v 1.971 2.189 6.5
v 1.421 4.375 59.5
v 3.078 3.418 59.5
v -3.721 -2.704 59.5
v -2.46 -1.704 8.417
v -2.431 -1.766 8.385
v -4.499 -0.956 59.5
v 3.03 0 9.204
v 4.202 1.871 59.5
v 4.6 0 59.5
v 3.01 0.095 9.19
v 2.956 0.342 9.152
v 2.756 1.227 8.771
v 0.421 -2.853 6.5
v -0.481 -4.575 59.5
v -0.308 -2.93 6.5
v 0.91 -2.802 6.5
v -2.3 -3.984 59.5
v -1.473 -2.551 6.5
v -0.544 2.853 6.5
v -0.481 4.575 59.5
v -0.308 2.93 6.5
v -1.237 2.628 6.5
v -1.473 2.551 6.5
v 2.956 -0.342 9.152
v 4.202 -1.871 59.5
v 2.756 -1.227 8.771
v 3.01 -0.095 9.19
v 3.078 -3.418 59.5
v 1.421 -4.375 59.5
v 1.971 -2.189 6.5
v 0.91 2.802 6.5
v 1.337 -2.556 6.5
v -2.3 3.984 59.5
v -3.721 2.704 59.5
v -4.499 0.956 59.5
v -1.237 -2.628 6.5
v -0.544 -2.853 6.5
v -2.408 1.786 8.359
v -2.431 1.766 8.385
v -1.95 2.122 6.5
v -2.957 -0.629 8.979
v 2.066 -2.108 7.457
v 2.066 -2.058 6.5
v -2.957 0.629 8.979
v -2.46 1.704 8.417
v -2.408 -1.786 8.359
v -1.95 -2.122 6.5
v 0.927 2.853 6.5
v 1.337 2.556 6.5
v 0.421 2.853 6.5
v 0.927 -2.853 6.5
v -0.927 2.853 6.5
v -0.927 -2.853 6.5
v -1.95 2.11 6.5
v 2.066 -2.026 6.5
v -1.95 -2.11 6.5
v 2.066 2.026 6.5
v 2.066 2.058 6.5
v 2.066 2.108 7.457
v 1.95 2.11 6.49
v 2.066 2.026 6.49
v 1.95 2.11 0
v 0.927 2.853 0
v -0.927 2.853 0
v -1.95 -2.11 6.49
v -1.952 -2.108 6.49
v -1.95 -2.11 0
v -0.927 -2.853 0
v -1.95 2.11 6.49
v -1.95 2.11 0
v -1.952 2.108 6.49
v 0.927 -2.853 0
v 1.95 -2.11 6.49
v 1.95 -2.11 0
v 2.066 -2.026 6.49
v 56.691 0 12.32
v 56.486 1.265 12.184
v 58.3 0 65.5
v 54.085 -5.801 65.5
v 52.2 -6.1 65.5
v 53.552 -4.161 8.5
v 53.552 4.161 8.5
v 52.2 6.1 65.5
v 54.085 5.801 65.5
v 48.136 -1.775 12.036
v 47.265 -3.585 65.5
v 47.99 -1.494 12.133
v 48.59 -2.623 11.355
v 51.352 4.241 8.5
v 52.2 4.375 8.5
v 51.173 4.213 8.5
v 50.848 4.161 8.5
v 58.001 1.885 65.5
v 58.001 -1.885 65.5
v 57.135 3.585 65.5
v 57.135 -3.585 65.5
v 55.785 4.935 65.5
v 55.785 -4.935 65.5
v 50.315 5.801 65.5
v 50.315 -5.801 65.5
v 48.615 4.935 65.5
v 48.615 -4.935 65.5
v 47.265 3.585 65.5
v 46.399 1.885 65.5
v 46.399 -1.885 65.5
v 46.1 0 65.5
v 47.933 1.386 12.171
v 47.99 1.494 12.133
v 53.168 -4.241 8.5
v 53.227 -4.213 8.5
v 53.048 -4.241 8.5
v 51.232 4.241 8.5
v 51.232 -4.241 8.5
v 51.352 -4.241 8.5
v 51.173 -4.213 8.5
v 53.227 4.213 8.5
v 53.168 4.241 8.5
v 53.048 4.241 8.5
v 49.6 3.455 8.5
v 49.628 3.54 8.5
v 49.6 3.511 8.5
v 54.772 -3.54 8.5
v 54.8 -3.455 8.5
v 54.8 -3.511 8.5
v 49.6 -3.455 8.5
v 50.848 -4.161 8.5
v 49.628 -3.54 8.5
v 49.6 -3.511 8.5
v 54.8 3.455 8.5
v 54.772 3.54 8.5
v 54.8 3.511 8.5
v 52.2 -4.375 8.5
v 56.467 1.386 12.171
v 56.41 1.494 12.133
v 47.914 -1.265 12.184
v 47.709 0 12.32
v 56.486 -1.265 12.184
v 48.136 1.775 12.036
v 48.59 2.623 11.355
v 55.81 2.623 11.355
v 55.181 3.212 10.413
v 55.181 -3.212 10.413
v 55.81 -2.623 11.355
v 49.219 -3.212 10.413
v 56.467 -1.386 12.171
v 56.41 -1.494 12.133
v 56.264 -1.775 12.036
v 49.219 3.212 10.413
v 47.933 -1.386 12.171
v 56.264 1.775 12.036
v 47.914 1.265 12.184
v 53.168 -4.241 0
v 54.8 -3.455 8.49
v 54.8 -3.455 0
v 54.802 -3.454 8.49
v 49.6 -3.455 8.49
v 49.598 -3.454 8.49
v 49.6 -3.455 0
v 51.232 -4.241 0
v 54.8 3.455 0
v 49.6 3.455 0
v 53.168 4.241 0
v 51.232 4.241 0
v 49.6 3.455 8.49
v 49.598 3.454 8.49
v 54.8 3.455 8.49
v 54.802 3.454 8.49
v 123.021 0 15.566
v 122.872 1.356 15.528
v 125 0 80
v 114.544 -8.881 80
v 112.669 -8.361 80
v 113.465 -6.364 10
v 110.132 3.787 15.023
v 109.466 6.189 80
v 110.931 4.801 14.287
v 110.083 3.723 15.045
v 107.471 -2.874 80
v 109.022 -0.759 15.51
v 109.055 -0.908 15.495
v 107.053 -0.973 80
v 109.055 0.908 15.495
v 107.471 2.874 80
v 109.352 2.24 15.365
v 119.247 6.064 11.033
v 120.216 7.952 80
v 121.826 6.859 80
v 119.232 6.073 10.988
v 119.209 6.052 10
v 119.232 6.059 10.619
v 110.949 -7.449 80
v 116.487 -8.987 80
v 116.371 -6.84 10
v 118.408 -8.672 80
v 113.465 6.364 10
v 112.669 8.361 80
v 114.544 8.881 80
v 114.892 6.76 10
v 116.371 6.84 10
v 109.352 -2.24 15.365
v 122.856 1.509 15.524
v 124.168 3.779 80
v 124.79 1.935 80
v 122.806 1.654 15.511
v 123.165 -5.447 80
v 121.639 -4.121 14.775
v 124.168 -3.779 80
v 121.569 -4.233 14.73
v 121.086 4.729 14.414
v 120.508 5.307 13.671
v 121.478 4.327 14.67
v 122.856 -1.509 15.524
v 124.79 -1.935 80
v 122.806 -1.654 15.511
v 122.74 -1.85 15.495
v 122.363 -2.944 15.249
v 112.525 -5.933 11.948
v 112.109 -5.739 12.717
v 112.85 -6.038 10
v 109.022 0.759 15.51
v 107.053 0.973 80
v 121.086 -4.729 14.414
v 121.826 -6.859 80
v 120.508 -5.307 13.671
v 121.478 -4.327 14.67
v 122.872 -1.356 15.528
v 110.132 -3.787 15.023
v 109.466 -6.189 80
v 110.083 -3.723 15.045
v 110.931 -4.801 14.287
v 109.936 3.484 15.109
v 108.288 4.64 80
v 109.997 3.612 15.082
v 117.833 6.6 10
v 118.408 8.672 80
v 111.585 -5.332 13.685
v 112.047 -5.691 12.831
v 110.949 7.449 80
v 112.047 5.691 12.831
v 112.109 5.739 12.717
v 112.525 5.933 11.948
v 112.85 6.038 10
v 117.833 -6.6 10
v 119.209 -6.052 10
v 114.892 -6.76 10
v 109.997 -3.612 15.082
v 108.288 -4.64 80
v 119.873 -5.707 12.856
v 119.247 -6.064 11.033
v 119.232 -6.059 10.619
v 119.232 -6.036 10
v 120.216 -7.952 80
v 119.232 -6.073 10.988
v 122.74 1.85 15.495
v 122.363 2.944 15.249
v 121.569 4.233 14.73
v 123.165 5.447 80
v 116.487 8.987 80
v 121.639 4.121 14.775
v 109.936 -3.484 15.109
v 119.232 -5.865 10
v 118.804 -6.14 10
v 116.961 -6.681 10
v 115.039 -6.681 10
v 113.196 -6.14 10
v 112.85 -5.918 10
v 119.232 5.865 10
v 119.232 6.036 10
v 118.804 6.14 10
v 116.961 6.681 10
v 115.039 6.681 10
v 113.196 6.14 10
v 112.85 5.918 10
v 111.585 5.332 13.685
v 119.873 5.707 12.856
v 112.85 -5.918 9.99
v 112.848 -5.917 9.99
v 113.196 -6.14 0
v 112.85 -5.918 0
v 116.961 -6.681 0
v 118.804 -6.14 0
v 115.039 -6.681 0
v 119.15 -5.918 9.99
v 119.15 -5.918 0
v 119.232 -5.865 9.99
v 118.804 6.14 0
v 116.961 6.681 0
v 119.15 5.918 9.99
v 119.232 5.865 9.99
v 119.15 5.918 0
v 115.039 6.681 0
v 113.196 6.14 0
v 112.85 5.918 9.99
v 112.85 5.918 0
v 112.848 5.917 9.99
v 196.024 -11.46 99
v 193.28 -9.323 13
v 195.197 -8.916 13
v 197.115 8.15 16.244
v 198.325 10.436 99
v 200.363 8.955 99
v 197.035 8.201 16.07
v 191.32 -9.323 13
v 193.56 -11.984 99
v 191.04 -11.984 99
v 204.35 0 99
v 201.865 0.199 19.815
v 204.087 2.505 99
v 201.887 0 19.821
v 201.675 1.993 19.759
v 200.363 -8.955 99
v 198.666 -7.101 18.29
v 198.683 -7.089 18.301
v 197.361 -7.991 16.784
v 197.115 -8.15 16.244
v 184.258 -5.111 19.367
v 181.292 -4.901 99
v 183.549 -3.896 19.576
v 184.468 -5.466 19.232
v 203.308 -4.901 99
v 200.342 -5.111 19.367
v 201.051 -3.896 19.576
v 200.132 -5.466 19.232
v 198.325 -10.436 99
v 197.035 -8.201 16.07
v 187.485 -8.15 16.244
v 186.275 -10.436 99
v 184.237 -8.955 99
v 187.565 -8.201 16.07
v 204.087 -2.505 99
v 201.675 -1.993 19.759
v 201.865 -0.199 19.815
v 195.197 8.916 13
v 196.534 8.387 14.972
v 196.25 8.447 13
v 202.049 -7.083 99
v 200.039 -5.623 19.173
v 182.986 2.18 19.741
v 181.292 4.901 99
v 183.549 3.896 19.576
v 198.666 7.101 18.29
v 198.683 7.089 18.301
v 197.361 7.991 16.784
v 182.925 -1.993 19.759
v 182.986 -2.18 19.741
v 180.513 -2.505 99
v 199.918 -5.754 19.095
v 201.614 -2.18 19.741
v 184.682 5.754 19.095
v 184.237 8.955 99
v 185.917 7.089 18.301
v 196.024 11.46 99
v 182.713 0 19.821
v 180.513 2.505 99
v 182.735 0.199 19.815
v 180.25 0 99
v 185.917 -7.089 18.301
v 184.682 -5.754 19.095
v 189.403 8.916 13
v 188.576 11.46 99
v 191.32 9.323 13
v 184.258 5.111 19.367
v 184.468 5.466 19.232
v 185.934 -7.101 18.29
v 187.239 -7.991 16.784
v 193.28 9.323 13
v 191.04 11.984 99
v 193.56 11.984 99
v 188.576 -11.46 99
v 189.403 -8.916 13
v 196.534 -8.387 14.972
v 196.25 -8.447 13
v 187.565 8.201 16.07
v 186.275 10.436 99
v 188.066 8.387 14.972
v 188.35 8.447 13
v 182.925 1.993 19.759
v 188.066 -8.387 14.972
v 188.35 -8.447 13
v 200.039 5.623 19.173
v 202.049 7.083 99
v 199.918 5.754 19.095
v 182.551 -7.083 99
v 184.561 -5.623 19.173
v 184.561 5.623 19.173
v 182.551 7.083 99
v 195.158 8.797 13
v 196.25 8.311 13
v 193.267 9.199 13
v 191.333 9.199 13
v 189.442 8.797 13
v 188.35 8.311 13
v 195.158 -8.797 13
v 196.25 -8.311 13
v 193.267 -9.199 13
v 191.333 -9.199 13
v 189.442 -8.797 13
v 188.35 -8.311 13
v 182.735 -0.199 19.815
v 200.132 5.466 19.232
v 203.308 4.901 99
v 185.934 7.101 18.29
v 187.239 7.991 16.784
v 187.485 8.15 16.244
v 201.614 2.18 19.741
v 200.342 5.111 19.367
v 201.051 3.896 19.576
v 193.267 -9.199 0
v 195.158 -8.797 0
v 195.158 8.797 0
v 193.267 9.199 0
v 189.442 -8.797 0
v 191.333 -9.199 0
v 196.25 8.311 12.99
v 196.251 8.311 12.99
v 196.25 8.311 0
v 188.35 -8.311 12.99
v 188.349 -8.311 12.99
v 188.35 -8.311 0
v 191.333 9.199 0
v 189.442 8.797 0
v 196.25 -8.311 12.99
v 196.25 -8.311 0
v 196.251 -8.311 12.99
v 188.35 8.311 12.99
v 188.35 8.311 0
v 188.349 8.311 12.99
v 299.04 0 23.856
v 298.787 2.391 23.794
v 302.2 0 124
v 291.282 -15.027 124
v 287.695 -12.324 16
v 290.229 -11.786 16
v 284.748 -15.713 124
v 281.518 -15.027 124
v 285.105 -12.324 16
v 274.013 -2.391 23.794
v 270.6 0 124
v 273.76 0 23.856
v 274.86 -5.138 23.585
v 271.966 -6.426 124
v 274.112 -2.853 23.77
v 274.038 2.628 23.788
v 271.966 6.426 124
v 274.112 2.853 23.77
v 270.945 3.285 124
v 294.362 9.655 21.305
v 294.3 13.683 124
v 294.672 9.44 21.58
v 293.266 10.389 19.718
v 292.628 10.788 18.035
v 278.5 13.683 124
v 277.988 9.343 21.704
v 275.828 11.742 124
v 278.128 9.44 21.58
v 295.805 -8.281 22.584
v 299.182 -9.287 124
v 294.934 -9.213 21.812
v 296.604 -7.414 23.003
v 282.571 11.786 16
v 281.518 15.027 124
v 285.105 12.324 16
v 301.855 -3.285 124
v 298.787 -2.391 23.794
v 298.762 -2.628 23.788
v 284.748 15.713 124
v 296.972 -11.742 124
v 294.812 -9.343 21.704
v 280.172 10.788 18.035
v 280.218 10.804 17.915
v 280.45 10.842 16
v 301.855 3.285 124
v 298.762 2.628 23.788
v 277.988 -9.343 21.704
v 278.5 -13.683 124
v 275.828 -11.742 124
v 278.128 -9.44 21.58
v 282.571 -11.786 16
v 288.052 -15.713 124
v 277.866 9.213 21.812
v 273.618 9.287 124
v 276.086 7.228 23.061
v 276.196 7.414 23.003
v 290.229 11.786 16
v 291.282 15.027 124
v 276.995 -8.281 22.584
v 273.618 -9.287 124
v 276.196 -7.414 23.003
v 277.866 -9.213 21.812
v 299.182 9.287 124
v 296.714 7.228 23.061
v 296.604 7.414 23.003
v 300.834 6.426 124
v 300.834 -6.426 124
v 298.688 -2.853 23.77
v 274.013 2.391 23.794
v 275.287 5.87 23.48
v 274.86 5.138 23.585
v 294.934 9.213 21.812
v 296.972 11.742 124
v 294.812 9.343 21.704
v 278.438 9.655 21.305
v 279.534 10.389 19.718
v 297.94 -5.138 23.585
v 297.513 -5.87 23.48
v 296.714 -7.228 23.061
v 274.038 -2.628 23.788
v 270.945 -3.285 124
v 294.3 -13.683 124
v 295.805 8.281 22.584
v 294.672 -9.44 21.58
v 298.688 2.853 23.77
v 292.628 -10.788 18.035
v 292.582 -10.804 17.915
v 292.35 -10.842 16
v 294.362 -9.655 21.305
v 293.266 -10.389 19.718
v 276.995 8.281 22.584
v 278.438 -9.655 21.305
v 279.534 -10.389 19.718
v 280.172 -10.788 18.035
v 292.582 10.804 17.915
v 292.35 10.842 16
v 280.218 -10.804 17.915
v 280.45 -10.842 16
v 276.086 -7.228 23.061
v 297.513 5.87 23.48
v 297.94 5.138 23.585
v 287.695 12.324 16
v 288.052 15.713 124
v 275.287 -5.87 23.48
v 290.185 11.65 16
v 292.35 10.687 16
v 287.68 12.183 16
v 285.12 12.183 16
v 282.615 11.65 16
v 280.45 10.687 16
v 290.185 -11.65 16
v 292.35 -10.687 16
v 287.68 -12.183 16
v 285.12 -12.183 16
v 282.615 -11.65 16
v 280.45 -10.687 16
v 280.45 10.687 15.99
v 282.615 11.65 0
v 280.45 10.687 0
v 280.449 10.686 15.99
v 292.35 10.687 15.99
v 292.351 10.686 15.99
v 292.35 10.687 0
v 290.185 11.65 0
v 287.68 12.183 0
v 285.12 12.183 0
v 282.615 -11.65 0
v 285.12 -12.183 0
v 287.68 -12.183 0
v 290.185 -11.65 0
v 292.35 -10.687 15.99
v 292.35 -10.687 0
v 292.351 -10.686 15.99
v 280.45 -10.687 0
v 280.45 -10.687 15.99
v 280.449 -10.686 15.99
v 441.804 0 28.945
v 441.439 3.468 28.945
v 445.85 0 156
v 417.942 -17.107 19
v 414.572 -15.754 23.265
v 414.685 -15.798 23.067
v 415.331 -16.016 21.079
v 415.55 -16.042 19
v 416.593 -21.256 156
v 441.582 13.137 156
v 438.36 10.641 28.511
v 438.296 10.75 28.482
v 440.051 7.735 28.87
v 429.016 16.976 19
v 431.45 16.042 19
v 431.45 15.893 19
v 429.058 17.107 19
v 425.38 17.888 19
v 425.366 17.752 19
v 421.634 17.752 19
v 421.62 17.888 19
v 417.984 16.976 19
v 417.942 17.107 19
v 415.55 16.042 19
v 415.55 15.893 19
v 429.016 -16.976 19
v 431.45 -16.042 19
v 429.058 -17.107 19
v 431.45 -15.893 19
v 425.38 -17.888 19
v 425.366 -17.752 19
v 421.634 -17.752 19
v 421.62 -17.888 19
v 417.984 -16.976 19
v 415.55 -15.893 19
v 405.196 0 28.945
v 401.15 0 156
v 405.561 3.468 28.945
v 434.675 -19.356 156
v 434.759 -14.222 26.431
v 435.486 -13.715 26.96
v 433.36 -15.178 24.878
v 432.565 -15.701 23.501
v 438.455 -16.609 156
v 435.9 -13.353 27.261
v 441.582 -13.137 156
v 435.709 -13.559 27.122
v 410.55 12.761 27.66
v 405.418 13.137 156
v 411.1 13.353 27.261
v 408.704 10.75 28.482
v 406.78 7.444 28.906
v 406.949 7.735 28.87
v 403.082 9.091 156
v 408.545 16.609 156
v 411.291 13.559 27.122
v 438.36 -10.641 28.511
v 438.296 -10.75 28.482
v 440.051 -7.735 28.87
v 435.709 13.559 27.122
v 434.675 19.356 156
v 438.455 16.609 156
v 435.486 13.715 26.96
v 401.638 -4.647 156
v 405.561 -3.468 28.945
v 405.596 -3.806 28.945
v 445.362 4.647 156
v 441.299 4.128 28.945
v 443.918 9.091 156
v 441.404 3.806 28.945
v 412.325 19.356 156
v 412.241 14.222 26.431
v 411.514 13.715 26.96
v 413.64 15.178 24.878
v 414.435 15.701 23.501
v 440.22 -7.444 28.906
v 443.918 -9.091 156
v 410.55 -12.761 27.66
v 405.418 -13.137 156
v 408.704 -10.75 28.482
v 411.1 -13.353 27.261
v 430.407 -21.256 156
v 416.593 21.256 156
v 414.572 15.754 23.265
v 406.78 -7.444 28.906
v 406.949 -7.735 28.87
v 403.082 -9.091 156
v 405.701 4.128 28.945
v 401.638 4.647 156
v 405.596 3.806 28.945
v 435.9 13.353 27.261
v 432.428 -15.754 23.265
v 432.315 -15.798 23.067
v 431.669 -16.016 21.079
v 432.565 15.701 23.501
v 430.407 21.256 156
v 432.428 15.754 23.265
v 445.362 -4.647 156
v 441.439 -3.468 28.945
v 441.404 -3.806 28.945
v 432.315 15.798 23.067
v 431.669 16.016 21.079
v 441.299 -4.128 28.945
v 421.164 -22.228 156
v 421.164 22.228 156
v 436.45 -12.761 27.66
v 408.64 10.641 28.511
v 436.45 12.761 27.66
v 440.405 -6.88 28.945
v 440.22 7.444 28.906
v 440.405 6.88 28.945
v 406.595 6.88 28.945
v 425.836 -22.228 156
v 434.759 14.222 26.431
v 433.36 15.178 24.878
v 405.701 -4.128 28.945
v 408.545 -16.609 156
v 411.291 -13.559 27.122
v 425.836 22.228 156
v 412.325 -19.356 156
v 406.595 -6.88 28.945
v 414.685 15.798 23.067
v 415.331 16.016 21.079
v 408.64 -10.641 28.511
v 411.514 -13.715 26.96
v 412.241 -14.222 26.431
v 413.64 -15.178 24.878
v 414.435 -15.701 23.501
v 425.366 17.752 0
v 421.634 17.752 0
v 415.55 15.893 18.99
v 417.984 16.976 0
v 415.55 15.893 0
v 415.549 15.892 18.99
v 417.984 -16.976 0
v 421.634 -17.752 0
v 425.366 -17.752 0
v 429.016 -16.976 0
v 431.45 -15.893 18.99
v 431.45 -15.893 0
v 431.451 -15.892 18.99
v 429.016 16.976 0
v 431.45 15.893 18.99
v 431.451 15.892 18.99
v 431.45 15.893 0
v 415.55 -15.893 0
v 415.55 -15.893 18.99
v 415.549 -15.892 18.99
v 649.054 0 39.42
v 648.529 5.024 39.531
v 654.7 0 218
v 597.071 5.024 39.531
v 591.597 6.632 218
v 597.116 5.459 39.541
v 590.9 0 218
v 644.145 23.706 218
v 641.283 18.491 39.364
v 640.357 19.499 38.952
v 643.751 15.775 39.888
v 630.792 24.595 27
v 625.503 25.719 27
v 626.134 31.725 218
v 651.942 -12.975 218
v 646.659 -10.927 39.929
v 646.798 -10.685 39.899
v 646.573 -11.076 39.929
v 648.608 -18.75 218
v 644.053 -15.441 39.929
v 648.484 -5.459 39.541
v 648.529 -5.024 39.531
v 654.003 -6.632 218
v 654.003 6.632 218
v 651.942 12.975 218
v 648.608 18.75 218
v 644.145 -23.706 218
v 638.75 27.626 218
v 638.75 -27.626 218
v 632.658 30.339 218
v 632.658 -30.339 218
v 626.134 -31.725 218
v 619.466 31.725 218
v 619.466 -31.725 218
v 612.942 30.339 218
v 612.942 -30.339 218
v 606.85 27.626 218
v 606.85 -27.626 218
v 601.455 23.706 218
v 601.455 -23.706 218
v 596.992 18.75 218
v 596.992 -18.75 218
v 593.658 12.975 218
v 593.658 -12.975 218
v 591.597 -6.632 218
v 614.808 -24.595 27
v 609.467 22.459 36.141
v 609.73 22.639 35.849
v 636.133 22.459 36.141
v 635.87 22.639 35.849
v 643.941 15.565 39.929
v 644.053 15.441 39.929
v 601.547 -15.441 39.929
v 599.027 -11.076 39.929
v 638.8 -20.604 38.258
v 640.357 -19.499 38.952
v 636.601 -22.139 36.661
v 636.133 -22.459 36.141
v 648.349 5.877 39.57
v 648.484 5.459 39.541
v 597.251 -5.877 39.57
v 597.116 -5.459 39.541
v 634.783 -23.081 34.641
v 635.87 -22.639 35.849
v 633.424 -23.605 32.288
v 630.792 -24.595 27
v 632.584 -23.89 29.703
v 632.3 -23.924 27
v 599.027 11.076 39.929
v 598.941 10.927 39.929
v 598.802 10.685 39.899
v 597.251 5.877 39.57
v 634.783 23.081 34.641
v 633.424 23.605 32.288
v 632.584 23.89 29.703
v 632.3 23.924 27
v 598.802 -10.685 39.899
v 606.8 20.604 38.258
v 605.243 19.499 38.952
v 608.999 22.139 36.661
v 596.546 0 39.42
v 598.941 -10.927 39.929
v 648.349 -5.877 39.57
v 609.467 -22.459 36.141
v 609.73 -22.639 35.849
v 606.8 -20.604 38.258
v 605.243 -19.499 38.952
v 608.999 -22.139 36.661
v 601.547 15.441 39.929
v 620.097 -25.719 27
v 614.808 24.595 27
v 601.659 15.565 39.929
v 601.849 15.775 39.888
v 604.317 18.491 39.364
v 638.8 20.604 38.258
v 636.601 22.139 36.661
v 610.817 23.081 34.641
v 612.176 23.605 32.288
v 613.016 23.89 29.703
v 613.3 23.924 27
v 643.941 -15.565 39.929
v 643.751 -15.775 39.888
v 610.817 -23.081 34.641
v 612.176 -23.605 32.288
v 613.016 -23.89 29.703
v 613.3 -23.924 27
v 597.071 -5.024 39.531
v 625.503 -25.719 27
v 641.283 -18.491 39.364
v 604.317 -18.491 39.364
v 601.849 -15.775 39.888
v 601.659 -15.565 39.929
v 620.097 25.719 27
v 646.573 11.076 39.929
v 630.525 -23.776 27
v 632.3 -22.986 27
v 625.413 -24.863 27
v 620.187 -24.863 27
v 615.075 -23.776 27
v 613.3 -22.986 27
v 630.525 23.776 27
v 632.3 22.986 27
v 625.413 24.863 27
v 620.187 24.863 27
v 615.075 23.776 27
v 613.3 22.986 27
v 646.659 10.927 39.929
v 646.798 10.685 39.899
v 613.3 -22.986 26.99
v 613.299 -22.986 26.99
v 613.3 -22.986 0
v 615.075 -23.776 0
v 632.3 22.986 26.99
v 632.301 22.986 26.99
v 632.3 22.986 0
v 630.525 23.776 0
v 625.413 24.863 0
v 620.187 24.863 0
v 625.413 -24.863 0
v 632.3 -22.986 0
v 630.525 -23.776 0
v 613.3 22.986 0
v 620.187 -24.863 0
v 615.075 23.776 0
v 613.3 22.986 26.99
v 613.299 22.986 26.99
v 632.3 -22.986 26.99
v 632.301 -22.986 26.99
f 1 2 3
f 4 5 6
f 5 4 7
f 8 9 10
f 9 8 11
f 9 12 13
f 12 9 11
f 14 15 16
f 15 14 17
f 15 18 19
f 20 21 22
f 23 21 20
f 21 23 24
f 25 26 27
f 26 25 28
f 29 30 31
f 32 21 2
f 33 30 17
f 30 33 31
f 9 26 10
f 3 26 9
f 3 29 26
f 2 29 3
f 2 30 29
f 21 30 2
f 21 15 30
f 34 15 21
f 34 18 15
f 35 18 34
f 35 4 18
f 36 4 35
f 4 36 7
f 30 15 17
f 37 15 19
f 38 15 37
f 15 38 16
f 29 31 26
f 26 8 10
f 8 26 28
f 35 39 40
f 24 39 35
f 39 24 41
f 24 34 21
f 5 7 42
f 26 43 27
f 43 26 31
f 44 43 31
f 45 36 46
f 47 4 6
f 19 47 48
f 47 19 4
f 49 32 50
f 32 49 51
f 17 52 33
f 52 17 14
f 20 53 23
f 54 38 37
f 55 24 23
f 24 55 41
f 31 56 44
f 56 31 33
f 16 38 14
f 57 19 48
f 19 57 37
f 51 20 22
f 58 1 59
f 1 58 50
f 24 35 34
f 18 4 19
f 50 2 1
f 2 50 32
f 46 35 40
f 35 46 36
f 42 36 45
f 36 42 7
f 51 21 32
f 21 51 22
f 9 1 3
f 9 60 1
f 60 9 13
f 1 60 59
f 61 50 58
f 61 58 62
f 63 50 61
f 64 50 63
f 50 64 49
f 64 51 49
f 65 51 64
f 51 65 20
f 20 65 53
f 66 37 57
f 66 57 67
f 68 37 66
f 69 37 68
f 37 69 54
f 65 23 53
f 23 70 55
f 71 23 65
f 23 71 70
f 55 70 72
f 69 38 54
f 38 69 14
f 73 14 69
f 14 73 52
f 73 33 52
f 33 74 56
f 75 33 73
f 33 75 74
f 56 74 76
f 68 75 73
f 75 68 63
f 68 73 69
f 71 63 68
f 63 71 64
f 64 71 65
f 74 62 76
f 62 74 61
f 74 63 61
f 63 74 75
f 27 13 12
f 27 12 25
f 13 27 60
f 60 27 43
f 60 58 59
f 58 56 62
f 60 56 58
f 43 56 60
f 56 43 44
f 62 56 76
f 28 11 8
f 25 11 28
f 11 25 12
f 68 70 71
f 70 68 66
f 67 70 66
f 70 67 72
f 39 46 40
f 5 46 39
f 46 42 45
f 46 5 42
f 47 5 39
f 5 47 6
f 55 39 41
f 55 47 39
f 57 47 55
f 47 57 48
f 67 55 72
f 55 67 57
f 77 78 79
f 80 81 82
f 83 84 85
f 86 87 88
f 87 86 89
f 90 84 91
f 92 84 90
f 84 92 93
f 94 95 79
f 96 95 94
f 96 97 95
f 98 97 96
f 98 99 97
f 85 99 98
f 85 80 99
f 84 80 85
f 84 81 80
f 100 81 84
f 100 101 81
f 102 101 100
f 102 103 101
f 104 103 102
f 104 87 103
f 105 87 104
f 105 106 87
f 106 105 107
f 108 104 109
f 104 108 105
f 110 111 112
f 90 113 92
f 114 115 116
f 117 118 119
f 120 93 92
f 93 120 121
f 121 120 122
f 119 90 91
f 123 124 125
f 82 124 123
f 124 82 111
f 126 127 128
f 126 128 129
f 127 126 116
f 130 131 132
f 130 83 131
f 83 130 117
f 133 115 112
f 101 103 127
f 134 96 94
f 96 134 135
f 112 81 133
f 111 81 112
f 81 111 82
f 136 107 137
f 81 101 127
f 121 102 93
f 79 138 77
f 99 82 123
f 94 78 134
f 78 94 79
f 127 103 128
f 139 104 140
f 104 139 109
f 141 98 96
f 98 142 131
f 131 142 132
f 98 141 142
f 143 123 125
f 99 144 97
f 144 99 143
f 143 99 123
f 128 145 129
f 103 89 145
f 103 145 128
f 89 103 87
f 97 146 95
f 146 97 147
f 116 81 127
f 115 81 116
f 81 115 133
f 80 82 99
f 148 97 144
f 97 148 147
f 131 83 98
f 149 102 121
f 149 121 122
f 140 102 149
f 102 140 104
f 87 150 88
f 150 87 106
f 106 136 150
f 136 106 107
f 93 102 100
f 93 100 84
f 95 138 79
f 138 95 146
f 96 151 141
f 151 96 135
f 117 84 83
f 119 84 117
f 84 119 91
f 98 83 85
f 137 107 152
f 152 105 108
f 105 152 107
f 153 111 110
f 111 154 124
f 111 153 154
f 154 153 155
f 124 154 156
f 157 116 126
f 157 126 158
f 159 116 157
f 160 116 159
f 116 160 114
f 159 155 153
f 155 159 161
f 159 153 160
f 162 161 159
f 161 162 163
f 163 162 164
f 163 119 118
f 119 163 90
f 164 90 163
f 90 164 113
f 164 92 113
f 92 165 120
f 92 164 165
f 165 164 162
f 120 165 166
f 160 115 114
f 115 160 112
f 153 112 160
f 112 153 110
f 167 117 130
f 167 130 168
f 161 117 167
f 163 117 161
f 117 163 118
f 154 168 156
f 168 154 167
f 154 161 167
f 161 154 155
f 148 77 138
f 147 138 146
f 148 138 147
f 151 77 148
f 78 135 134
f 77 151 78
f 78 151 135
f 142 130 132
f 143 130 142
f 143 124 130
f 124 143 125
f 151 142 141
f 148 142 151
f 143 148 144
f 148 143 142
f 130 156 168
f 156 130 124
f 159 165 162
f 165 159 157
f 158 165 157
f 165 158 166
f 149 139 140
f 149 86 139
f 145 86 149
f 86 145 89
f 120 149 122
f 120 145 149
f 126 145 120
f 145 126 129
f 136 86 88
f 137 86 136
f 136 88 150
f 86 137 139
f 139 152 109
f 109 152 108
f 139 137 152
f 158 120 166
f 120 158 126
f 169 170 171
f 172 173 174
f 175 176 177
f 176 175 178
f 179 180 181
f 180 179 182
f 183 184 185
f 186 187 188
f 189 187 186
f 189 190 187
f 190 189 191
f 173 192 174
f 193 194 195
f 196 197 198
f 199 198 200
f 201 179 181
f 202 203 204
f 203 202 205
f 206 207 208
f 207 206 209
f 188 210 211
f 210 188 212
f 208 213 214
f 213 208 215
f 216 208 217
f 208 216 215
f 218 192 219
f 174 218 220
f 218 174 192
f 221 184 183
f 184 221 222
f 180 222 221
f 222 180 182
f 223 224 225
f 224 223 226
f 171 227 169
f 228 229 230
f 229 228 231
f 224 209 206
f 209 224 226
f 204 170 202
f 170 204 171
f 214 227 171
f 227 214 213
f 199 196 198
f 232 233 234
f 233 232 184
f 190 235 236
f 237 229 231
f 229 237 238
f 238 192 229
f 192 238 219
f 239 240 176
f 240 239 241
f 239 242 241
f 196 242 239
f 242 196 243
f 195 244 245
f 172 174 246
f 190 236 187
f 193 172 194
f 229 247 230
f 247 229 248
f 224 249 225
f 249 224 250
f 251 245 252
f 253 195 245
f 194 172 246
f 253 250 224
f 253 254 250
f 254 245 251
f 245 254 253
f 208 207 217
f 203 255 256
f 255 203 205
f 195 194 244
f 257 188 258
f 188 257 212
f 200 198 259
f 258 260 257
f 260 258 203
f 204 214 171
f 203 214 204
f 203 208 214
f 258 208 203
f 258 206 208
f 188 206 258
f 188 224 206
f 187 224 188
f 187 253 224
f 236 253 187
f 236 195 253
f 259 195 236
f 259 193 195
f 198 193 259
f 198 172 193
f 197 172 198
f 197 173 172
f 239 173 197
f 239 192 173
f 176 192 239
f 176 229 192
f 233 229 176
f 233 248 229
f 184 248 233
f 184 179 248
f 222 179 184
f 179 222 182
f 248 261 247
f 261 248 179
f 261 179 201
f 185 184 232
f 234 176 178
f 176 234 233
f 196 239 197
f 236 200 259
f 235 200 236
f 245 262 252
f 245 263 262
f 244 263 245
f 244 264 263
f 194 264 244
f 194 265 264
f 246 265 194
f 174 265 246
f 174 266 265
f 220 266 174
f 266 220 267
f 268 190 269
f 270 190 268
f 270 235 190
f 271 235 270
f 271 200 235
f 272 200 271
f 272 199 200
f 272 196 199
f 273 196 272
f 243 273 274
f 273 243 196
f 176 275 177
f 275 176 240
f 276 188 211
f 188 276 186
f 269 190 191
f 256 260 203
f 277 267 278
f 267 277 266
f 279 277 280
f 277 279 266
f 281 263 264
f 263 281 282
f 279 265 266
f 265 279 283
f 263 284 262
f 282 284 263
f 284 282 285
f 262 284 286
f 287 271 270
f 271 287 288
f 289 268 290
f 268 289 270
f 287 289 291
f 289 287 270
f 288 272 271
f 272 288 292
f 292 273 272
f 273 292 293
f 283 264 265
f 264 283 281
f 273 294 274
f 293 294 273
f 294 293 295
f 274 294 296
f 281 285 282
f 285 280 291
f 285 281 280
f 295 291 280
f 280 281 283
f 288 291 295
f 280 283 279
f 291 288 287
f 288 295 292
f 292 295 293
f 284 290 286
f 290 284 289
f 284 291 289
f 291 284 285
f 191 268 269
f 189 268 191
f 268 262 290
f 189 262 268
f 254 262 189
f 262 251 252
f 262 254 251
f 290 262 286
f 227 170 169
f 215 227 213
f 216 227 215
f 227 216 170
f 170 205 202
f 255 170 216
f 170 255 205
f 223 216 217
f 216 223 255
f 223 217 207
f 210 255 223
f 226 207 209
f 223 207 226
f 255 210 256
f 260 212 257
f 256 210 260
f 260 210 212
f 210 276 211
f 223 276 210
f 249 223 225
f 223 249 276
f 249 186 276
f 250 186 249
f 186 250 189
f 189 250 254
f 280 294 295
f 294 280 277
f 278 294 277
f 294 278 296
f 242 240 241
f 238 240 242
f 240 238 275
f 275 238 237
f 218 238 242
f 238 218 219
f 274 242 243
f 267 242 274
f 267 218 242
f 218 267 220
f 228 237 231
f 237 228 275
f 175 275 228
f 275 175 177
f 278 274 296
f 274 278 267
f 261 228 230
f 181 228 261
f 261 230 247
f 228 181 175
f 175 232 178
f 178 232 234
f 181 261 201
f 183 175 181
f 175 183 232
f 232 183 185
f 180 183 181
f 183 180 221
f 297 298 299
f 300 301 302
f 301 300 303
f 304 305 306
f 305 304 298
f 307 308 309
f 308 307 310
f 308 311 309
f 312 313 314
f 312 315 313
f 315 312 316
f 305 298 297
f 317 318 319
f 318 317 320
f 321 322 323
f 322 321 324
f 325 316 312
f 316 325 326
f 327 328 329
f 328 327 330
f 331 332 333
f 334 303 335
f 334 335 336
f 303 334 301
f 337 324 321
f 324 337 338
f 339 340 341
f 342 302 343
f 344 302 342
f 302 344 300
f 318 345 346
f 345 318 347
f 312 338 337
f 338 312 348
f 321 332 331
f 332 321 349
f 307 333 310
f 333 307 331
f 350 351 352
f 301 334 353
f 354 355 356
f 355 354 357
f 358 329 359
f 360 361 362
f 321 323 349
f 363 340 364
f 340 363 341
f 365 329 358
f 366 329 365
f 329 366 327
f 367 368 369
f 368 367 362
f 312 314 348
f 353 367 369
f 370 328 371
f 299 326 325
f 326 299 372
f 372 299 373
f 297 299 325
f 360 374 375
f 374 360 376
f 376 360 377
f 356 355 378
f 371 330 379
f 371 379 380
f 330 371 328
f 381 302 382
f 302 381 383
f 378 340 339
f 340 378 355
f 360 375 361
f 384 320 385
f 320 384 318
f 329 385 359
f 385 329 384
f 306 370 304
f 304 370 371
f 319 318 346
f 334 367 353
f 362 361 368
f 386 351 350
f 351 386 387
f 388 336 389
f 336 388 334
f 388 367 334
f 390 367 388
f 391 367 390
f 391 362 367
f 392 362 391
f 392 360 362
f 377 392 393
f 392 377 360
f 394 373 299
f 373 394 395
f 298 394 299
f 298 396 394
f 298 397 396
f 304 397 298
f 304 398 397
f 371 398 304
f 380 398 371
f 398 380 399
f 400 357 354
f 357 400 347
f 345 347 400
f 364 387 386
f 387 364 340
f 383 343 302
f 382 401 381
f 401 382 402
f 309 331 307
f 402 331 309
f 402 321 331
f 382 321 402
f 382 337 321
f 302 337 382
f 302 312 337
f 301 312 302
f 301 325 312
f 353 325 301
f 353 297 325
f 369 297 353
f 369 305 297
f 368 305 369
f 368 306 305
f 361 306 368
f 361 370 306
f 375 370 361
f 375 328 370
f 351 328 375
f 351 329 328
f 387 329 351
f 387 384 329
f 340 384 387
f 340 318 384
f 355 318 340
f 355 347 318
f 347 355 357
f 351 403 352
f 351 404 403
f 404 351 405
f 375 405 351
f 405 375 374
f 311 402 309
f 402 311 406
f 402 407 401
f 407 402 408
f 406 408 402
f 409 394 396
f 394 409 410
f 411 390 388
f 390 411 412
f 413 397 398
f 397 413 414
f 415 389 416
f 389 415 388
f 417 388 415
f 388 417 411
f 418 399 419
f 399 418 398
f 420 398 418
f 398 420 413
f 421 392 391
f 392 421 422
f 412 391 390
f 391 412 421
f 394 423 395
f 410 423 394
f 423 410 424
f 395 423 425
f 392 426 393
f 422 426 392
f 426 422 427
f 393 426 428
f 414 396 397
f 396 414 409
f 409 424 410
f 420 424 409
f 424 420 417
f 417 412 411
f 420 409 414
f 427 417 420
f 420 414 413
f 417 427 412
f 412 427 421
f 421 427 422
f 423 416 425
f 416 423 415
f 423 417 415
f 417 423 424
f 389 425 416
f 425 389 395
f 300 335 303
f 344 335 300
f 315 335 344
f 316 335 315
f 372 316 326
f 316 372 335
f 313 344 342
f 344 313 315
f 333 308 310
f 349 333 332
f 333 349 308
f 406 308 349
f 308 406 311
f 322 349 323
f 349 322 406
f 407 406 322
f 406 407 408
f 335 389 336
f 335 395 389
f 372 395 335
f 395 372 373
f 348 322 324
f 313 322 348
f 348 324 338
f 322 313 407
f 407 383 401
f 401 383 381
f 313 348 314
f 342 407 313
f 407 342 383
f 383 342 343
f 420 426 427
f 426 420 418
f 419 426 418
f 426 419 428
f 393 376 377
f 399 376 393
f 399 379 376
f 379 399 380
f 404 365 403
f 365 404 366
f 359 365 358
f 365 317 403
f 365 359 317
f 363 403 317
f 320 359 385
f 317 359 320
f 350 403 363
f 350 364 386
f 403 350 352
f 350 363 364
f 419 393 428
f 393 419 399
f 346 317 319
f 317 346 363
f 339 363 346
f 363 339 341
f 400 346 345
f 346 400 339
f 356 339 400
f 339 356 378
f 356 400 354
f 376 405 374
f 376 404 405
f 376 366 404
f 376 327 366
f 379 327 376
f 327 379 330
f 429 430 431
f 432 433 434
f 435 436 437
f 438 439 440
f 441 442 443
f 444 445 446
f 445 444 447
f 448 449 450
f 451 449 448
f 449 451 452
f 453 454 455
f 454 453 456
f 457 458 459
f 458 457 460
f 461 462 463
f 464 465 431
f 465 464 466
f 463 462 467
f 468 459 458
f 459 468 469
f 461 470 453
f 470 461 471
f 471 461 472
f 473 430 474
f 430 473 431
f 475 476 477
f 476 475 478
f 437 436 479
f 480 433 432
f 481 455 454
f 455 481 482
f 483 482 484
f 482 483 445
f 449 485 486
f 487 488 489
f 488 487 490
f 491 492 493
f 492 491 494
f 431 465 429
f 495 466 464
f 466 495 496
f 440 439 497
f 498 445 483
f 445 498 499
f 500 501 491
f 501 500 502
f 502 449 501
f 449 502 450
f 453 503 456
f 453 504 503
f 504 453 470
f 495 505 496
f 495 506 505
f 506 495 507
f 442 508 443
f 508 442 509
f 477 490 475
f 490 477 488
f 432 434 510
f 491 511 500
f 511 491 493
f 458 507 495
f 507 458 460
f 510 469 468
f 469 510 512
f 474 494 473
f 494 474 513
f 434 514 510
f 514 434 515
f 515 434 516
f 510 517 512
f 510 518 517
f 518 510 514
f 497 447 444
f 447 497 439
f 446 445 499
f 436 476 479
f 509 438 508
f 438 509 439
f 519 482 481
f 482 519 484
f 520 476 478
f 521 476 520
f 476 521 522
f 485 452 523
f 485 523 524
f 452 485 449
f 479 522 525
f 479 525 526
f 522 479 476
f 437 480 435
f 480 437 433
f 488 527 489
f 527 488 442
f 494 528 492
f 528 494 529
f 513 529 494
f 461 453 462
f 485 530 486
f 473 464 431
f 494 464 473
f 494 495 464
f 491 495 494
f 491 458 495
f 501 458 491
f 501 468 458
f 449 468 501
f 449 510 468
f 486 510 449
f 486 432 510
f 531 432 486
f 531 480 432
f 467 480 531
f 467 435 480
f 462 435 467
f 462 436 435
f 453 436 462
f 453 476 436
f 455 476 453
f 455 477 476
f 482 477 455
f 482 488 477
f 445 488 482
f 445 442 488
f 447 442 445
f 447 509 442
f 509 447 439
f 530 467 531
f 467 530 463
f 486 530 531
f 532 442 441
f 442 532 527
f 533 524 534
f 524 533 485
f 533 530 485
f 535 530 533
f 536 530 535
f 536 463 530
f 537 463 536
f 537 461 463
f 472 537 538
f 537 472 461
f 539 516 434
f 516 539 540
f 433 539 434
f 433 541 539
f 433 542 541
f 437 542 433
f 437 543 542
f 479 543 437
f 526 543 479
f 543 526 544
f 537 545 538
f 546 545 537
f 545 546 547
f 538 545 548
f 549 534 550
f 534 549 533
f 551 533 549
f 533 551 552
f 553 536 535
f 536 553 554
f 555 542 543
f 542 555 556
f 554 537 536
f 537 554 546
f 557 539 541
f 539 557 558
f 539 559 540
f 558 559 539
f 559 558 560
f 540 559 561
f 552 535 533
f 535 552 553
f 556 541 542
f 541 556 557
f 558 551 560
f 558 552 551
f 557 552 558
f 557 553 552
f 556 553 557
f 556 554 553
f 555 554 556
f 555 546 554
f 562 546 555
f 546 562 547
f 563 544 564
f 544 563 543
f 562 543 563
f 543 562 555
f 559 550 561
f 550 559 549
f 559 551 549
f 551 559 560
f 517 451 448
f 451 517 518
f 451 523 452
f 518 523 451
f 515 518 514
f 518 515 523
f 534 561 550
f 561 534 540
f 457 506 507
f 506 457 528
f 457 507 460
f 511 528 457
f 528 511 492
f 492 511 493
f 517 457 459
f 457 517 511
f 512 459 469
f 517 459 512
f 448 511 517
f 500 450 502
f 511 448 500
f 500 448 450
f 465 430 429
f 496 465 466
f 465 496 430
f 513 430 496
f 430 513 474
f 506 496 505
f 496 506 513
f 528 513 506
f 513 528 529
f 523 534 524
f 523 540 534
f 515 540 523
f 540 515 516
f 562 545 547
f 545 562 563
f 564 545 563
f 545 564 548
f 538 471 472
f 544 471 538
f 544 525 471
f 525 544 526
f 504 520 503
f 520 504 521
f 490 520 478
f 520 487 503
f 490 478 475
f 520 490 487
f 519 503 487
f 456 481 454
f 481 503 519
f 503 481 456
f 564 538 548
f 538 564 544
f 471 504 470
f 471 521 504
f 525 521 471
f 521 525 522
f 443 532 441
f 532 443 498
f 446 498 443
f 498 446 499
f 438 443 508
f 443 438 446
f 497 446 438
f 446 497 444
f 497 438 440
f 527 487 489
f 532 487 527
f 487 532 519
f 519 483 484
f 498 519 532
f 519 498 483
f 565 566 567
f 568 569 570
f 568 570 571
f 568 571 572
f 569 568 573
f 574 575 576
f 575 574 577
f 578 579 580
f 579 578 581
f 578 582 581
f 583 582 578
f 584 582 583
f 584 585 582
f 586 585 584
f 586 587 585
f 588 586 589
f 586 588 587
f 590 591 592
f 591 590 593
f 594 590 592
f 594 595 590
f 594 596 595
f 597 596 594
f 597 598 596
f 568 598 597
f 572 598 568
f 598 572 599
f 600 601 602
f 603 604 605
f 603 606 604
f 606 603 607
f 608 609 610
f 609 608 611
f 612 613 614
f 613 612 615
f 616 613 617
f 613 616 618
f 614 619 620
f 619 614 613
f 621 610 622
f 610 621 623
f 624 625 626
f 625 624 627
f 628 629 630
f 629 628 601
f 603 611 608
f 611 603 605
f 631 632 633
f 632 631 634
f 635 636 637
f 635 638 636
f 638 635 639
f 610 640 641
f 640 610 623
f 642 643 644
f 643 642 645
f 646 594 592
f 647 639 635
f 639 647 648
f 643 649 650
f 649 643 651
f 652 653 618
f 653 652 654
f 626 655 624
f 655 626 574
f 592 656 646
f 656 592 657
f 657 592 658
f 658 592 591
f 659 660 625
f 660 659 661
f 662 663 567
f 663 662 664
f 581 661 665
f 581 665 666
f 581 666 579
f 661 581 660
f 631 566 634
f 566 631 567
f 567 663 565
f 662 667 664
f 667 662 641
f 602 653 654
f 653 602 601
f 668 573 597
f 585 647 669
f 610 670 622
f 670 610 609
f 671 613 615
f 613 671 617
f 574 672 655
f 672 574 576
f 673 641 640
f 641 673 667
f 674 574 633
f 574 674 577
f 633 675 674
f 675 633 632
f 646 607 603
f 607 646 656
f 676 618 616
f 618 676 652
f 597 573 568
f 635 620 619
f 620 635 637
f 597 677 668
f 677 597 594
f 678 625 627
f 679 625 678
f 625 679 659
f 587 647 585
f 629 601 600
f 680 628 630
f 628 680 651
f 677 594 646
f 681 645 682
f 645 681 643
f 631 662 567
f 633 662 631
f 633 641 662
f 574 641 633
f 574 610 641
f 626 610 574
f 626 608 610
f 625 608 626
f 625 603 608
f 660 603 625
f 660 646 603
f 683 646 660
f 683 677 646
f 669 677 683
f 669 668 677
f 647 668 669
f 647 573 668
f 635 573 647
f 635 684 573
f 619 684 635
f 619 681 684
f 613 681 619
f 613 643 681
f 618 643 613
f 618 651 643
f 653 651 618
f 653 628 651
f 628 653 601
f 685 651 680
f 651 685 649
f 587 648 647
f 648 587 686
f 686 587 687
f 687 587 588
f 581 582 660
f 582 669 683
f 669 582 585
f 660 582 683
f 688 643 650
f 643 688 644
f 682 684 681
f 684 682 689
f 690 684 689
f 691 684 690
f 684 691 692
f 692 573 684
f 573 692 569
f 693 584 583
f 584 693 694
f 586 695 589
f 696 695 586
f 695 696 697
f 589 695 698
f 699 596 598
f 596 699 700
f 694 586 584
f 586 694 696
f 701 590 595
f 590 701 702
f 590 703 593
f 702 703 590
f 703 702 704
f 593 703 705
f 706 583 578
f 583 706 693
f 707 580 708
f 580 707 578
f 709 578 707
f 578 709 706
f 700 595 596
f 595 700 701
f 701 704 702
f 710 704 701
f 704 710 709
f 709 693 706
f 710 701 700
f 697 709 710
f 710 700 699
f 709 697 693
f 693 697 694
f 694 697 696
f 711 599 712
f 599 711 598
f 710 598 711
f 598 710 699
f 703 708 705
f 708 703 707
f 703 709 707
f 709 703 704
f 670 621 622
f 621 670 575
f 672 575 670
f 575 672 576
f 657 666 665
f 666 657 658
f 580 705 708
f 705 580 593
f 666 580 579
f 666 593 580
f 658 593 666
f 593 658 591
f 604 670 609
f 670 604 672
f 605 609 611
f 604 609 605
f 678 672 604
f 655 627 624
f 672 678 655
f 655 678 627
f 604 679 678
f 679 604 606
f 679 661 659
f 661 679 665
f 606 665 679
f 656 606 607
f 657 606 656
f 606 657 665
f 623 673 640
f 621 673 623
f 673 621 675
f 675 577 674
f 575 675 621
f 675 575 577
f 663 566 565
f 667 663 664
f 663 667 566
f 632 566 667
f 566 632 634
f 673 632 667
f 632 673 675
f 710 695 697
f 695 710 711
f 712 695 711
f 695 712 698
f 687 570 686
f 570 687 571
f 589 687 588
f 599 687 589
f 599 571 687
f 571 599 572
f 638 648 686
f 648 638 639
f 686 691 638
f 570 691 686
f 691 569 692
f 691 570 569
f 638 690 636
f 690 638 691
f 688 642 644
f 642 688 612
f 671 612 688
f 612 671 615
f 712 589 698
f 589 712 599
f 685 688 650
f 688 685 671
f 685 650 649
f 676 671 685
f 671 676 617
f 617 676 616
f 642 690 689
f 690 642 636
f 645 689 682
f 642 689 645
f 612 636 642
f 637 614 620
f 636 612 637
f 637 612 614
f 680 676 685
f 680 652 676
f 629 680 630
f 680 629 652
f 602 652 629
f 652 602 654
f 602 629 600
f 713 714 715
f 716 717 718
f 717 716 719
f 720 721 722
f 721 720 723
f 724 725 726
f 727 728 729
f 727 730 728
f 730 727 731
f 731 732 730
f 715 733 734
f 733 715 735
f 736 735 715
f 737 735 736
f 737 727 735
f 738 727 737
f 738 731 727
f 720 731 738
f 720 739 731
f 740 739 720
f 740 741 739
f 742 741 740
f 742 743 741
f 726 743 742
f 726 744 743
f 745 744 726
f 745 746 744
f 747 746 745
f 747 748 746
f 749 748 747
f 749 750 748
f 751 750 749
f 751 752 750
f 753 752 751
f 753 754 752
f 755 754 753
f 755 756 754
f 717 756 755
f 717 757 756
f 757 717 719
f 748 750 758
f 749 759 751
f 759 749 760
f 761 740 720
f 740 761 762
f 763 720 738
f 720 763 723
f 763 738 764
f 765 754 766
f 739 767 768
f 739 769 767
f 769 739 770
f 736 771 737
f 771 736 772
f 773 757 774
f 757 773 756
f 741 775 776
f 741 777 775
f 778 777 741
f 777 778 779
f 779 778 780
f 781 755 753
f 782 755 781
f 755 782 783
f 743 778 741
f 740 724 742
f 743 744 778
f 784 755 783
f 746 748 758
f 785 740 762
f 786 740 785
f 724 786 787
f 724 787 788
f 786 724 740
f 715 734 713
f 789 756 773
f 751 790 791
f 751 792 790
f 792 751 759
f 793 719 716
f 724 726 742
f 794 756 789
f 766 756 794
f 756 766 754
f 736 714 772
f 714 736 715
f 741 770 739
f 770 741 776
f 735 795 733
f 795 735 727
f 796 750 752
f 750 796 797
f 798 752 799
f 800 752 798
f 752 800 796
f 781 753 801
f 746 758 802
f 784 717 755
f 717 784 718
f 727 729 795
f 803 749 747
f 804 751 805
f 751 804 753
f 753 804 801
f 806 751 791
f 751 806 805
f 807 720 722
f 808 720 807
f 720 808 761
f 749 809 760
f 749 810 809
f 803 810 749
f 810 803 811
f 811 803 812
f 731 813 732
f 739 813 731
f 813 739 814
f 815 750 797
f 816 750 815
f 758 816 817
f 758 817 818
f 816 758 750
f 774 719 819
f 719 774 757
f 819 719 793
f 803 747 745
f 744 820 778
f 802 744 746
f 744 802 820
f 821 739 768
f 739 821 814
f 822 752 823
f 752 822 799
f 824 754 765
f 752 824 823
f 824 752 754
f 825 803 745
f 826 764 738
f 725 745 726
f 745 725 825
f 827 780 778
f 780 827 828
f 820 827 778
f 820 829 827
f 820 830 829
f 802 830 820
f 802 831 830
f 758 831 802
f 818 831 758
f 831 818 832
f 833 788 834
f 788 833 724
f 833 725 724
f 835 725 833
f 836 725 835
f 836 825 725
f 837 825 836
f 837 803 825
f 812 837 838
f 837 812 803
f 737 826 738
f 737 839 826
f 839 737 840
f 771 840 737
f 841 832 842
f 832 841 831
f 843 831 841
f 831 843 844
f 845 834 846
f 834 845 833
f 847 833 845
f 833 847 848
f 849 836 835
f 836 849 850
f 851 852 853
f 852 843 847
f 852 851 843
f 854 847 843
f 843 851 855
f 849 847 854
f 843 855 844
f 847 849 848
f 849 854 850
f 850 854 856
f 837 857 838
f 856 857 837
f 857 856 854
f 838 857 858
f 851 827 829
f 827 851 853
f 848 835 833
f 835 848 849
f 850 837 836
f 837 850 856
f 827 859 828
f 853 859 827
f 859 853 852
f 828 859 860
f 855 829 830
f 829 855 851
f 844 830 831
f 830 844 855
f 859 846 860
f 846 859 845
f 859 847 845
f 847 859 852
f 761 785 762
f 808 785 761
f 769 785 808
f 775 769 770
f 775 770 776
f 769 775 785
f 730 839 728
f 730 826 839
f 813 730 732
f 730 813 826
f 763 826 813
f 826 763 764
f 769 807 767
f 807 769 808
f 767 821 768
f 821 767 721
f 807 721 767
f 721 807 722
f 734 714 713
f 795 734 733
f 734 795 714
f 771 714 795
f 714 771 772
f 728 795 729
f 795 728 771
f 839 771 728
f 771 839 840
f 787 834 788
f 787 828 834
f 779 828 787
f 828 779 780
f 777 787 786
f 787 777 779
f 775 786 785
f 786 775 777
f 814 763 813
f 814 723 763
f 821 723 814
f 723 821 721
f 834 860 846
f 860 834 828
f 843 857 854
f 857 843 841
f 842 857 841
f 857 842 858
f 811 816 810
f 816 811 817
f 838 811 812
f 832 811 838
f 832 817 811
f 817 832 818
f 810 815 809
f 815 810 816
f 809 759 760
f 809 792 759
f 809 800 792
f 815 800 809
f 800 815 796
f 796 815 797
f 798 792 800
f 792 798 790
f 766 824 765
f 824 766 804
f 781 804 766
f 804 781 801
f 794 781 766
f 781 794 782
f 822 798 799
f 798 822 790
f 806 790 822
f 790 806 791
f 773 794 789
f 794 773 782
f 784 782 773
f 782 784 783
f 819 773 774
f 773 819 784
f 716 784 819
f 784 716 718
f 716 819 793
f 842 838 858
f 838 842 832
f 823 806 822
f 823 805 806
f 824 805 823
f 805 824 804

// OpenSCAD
// Morse tape

tolerance=0.01;
//Morse Tape Params (plan: https://upload.wikimedia.org/wikipedia/commons/9/99/Morse_Taper.png) 
MT_Params=[
//0 MT№,   1 ctg(a),    2 D,       	3 D1, 	4 d, 	5 d1, 	6 d2, 	7 d3max,8 d4max,9 d5,   10 l1max,   11 l2 max,  12 l3 max, 	13 l4 max, 	14 l5 min, 	15 l6,  16 e max,   17 R,   18 b,          
[0,        19.212, 	    9.045, 	    9.2, 	6.4, 	0,  	6.1, 	6,   	6,  	6.7, 	50, 	    53, 	    56.3,   	59.5,   	52,     	49,     10.5,       4,      3.9,],
[1,        20.047, 	    12.065, 	12.2, 	9.4,	6, 	    9, 	    8.7, 	9, 	    9.7, 	53.5, 	    57, 	    62, 	    65.5, 	    56,     	52,     13.5,       5,      5.2,],
[2,        20.020, 	    17.780, 	18,	    14.6, 	10, 	14,	    13.5, 	14, 	14.9, 	64, 	    69, 	    75, 	    80,     	67,     	62,     16,         6,      6.3,],
[3,        19.922, 	    23.825, 	24.1, 	19.8, 	12, 	19.1, 	18.5, 	19, 	20.2, 	80.1, 	    86, 	    94, 	    99,     	84,     	78,     20,         7,      7.9,],
[4,        19.254, 	    31.267, 	31.6, 	25.9, 	16, 	25.2, 	24.5, 	24, 	26.5, 	102.5, 	    109, 	    117.5,   	124,    	107,    	98,     24,         8,      11.9,],
[5,        19.002, 	    44.399, 	44.7, 	37.6, 	20, 	36.5, 	35.7, 	35.7, 	38.2, 	129.5, 	    136, 	    149.5,   	156,    	135,    	125,    29,         10,     15.9,],
[6,        19.180, 	    63.348, 	63.8, 	53.9, 	24, 	52.4, 	50, 	51, 	54.6, 	182, 	    190, 	    210,    	218,    	188,    	177,    40,         13,     19,],
[7,        19.231, 	    83.058,     0,      0,      0,      0,      0,      0,      0,      0,          0,          0,           0,         0,         0] 													
];
dx = 0;
for(n=[0:6]){
    translate([(MT_Params[n][3]+40)*n,0,0])
        mt(n);
}

module mt(N){
    difference(){
        union(){
    d1=MT_Params[N][6]-MT_Params[N][17]/MT_Params[N][1];
    translate([0,0,MT_Params[N][16]-MT_Params[N][17]])
        cylinder($tn = 100, h = MT_Params[N][13]-MT_Params[N][16]+MT_Params[N][17],d1=d1,d2=MT_Params[N][3]);
        cylinder($tn = 100, h = MT_Params[N][16]-MT_Params[N][17],d=MT_Params[N][7]);
        }
        union(){
            for(i=[1,-1]){
                translate([i*MT_Params[N][18]/2+(i-1)*MT_Params[N][16]/2,-MT_Params[N][3]/2,-tolerance])
                    cube([MT_Params[N][16],MT_Params[N][3],MT_Params[N][16]-MT_Params[N][17]]);
                    translate([i*MT_Params[N][18]/2+MT_Params[N][17]+(i-1)*MT_Params[N][17],MT_Params[N][3]/2,,MT_Params[N][16]-MT_Params[N][17]])
                    rotate([90,0,0])
                    cylinder($tn = 100, h =MT_Params[N][3],r=MT_Params[N][17]);
                    
                
            }
        }
    }
   }
